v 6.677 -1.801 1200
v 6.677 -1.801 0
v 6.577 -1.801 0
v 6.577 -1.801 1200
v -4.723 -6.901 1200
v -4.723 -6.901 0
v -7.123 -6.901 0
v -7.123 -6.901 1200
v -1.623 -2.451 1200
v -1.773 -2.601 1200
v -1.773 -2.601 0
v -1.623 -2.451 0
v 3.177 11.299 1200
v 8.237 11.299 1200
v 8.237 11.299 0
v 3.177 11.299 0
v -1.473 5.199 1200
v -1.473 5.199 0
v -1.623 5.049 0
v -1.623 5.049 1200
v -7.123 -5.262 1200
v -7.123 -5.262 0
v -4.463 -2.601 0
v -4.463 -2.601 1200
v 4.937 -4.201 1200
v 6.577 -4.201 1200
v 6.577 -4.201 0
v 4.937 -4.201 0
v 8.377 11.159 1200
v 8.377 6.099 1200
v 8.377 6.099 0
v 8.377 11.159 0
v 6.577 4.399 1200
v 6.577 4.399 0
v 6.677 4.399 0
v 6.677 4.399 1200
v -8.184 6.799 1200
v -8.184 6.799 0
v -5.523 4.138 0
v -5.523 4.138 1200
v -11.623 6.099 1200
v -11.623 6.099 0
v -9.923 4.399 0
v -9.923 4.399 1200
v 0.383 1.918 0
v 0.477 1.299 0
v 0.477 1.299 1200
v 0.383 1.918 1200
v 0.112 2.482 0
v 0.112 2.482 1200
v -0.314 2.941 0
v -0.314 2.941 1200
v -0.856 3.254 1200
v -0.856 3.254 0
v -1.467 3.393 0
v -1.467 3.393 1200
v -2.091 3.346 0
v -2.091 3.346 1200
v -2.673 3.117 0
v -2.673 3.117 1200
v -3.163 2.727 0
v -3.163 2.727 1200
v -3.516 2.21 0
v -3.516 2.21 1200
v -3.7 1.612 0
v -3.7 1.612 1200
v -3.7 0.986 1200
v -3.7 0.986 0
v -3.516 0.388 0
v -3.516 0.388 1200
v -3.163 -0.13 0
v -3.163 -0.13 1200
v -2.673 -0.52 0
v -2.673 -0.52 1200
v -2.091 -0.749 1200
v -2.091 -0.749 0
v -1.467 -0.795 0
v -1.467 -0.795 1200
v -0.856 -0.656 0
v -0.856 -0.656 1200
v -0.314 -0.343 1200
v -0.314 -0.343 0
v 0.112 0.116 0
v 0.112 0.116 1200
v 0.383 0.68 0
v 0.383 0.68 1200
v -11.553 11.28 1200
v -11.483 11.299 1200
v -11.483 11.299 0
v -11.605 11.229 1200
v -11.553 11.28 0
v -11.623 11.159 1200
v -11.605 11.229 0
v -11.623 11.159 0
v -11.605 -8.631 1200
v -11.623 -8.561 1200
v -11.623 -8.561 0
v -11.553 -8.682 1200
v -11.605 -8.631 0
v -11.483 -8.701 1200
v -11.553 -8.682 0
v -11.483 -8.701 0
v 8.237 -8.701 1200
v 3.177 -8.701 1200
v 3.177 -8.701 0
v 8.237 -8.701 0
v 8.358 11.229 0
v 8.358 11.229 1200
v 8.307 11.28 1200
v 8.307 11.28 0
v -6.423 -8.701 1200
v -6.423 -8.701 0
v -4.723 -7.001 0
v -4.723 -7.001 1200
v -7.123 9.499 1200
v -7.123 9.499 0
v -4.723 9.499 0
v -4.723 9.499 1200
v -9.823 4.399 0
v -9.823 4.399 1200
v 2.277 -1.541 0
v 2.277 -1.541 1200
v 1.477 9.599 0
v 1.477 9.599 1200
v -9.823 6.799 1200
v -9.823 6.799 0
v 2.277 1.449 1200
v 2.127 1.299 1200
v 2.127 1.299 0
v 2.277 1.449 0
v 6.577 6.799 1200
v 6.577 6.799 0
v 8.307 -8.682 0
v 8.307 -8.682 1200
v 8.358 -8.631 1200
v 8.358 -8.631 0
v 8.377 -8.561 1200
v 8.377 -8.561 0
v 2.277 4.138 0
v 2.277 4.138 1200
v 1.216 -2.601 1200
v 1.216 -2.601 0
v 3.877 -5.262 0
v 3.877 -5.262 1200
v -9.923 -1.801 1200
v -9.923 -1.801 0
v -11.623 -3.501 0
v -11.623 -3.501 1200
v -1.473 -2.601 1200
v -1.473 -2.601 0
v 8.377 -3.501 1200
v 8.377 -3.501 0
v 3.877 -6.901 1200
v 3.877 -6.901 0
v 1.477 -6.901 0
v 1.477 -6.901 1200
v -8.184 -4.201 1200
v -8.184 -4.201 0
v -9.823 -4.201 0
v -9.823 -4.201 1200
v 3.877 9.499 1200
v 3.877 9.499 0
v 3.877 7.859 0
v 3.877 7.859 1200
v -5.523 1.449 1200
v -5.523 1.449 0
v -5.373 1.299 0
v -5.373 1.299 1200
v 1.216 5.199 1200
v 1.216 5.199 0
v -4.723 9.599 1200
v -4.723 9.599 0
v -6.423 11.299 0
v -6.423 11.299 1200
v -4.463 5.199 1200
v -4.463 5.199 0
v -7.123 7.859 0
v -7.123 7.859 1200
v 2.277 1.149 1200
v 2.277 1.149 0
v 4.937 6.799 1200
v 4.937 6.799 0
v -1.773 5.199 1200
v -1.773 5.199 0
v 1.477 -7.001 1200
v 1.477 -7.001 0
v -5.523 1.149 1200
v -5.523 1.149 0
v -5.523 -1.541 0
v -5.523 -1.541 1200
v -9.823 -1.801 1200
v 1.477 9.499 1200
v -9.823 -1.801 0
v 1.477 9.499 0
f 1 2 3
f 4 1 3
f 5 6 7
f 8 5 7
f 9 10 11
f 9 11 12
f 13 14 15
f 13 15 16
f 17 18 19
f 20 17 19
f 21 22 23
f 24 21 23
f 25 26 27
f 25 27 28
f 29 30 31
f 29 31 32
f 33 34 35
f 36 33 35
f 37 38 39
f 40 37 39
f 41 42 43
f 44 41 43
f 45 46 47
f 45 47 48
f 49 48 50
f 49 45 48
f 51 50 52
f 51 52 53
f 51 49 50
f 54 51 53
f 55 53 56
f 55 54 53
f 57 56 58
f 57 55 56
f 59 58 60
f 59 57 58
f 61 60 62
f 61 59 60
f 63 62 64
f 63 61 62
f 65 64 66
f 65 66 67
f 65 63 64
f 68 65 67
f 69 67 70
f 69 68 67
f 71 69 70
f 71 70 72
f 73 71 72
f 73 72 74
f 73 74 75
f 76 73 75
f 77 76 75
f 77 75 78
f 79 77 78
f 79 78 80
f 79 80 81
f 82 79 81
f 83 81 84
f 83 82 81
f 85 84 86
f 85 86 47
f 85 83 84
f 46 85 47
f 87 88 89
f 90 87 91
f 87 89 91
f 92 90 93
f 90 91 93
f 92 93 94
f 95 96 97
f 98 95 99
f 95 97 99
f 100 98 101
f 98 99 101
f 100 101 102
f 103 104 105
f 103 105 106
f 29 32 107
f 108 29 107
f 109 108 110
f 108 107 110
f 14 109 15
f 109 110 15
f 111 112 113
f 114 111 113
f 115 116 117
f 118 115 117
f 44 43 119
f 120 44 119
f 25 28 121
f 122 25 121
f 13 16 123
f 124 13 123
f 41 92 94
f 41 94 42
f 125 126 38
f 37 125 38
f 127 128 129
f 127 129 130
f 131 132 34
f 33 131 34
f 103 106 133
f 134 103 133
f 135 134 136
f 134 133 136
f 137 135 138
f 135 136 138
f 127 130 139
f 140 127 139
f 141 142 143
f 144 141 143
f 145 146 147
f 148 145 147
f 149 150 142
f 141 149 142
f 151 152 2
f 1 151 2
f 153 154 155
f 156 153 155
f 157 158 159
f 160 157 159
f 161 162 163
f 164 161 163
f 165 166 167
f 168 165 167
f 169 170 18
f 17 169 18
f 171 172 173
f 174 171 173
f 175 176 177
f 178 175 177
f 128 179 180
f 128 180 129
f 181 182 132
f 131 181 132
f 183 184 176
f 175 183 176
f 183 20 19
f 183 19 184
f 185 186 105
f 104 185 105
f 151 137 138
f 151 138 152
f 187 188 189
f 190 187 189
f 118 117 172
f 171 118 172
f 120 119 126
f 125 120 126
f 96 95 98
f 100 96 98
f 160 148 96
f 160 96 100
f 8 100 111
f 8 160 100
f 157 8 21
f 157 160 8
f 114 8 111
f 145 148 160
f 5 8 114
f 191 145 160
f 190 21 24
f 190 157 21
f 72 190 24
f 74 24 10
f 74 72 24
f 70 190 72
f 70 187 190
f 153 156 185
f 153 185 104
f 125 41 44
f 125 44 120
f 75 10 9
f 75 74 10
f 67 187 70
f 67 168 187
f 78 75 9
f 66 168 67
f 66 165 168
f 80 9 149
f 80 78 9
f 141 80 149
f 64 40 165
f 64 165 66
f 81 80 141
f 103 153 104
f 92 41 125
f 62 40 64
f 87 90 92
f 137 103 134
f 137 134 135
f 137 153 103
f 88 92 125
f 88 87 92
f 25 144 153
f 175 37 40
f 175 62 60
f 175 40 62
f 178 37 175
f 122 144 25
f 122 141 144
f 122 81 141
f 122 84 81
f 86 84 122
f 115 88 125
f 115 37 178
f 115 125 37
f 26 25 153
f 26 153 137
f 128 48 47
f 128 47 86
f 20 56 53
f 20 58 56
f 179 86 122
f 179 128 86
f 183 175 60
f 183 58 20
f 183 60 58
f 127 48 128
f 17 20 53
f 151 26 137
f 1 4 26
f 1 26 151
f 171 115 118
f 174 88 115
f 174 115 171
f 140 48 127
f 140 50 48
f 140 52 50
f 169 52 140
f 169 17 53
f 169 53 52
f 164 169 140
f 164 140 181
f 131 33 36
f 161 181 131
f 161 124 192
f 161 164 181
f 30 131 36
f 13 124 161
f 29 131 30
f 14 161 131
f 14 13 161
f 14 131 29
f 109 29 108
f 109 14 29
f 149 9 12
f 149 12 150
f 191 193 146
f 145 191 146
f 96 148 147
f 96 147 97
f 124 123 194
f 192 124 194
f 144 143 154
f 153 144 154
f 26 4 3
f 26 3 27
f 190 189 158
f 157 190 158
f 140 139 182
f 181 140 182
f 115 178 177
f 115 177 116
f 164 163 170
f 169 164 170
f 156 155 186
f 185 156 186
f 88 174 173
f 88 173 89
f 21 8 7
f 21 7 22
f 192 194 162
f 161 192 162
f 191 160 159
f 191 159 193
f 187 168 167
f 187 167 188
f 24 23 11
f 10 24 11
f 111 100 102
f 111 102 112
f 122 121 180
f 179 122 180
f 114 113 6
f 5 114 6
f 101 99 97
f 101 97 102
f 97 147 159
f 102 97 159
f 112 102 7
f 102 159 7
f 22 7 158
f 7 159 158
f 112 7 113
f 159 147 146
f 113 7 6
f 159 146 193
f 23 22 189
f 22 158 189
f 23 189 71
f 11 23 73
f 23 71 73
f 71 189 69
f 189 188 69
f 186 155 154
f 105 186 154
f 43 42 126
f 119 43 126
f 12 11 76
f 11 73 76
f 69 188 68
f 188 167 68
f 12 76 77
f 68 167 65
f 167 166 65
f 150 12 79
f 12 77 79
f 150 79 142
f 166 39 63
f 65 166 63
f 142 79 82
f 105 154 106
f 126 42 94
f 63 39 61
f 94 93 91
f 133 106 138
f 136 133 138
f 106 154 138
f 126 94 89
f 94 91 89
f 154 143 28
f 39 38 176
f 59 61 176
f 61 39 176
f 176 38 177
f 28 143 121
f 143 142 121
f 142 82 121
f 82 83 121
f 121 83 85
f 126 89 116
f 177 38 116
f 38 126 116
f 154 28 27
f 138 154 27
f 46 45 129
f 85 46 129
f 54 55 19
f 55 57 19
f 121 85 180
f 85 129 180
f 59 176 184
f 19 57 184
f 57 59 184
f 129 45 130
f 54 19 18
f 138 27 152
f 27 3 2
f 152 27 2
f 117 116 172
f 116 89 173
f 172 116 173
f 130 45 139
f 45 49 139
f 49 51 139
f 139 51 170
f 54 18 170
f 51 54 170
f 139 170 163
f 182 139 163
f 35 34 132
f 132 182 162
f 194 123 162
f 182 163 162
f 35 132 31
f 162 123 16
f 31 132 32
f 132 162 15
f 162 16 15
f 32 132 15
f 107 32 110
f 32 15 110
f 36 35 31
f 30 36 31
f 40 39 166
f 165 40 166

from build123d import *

# Parameters (mm, degrees)
SKETCH1_R           = 2.1
BOSS_EXTRUDE1_DEPTH = 1200


with BuildPart() as part:
    # Sketch1 → Boss-Extrude1 (new body)
    with BuildSketch(Plane.XY):
        with BuildLine():
            Line((-11.623471319, -3.501222945), (-11.623471319, -8.561222945))
            ThreePointArc((-11.623471319, -8.561222945), (-11.582466268, -8.660217894), (-11.483471319, -8.701222945))
            Line((-11.483471319, -8.701222945), (-6.423471319, -8.701222945))
            Line((-6.423471319, -8.701222945), (-4.723471319, -7.001222945))
            Line((-4.723471319, -7.001222945), (-4.723471319, -6.901222945))
            Line((-4.723471319, -6.901222945), (-7.123471319, -6.901222945))
            Line((-7.123471319, -6.901222945), (-7.123471319, -5.261883117))
            Line((-7.123471319, -5.261883117), (-4.462811147, -2.601222945))
            Line((-4.462811147, -2.601222945), (-1.773471319, -2.601222945))
            Line((-1.773471319, -2.601222945), (-1.623471319, -2.451222945))
            Line((-1.623471319, -2.451222945), (-1.473471319, -2.601222945))
            Line((-1.473471319, -2.601222945), (1.215868509, -2.601222945))
            Line((1.215868509, -2.601222945), (3.876528681, -5.261883117))
            Line((3.876528681, -5.261883117), (3.876528681, -6.901222945))
            Line((3.876528681, -6.901222945), (1.476528681, -6.901222945))
            Line((1.476528681, -6.901222945), (1.476528681, -7.001222945))
            Line((1.476528681, -7.001222945), (3.176528681, -8.701222945))
            Line((3.176528681, -8.701222945), (8.236528681, -8.701222945))
            ThreePointArc((8.236528681, -8.701222945), (8.335523631, -8.660217894), (8.376528681, -8.561222945))
            Line((8.376528681, -8.561222945), (8.376528681, -3.501222945))
            Line((8.376528681, -3.501222945), (6.676528681, -1.801222945))
            Line((6.676528681, -1.801222945), (6.576528681, -1.801222945))
            Line((6.576528681, -1.801222945), (6.576528681, -4.201222945))
            Line((6.576528681, -4.201222945), (4.937188853, -4.201222945))
            Line((4.937188853, -4.201222945), (2.276528681, -1.540562773))
            Line((2.276528681, -1.540562773), (2.276528681, 1.148777055))
            Line((2.276528681, 1.148777055), (2.126528681, 1.298777055))
            Line((2.126528681, 1.298777055), (2.276528681, 1.448777055))
            Line((2.276528681, 1.448777055), (2.276528681, 4.138116883))
            Line((2.276528681, 4.138116883), (4.937188853, 6.798777055))
            Line((4.937188853, 6.798777055), (6.576528681, 6.798777055))
            Line((6.576528681, 6.798777055), (6.576528681, 4.398777055))
            Line((6.576528681, 4.398777055), (6.676528681, 4.398777055))
            Line((6.676528681, 4.398777055), (8.376528681, 6.098777055))
            Line((8.376528681, 6.098777055), (8.376528681, 11.158777055))
            ThreePointArc((8.376528681, 11.158777055), (8.335523631, 11.257772004), (8.236528681, 11.298777055))
            Line((8.236528681, 11.298777055), (3.176528681, 11.298777055))
            Line((3.176528681, 11.298777055), (1.476528681, 9.598777055))
            Line((1.476528681, 9.598777055), (1.476528681, 9.498777055))
            Line((1.476528681, 9.498777055), (3.876528681, 9.498777055))
            Line((3.876528681, 9.498777055), (3.876528681, 7.859437227))
            Line((3.876528681, 7.859437227), (1.215868509, 5.198777055))
            Line((1.215868509, 5.198777055), (-1.473471319, 5.198777055))
            Line((-1.473471319, 5.198777055), (-1.623471319, 5.048777055))
            Line((-1.623471319, 5.048777055), (-1.773471319, 5.198777055))
            Line((-1.773471319, 5.198777055), (-4.462811147, 5.198777055))
            Line((-4.462811147, 5.198777055), (-7.123471319, 7.859437227))
            Line((-7.123471319, 7.859437227), (-7.123471319, 9.498777055))
            Line((-7.123471319, 9.498777055), (-4.723471319, 9.498777055))
            Line((-4.723471319, 9.498777055), (-4.723471319, 9.598777055))
            Line((-4.723471319, 9.598777055), (-6.423471319, 11.298777055))
            Line((-6.423471319, 11.298777055), (-11.483471319, 11.298777055))
            ThreePointArc((-11.483471319, 11.298777055), (-11.582466268, 11.257772004), (-11.623471319, 11.158777055))
            Line((-11.623471319, 11.158777055), (-11.623471319, 6.098777055))
            Line((-11.623471319, 6.098777055), (-9.923471319, 4.398777055))
            Line((-9.923471319, 4.398777055), (-9.823471319, 4.398777055))
            Line((-9.823471319, 4.398777055), (-9.823471319, 6.798777055))
            Line((-9.823471319, 6.798777055), (-8.184131491, 6.798777055))
            Line((-8.184131491, 6.798777055), (-5.523471319, 4.138116883))
            Line((-5.523471319, 4.138116883), (-5.523471319, 1.448777055))
            Line((-5.523471319, 1.448777055), (-5.373471319, 1.298777055))
            Line((-5.373471319, 1.298777055), (-5.523471319, 1.148777055))
            Line((-5.523471319, 1.148777055), (-5.523471319, -1.540562773))
            Line((-5.523471319, -1.540562773), (-8.184131491, -4.201222945))
            Line((-8.184131491, -4.201222945), (-9.823471319, -4.201222945))
            Line((-9.823471319, -4.201222945), (-9.823471319, -1.801222945))
            Line((-9.823471319, -1.801222945), (-9.923471319, -1.801222945))
            Line((-9.923471319, -1.801222945), (-11.623471319, -3.501222945))
        make_face()
        with Locations((-1.623471319, 1.298777055)):
            Circle(SKETCH1_R, mode=Mode.SUBTRACT)
    extrude(amount=BOSS_EXTRUDE1_DEPTH)


solid = part.part
